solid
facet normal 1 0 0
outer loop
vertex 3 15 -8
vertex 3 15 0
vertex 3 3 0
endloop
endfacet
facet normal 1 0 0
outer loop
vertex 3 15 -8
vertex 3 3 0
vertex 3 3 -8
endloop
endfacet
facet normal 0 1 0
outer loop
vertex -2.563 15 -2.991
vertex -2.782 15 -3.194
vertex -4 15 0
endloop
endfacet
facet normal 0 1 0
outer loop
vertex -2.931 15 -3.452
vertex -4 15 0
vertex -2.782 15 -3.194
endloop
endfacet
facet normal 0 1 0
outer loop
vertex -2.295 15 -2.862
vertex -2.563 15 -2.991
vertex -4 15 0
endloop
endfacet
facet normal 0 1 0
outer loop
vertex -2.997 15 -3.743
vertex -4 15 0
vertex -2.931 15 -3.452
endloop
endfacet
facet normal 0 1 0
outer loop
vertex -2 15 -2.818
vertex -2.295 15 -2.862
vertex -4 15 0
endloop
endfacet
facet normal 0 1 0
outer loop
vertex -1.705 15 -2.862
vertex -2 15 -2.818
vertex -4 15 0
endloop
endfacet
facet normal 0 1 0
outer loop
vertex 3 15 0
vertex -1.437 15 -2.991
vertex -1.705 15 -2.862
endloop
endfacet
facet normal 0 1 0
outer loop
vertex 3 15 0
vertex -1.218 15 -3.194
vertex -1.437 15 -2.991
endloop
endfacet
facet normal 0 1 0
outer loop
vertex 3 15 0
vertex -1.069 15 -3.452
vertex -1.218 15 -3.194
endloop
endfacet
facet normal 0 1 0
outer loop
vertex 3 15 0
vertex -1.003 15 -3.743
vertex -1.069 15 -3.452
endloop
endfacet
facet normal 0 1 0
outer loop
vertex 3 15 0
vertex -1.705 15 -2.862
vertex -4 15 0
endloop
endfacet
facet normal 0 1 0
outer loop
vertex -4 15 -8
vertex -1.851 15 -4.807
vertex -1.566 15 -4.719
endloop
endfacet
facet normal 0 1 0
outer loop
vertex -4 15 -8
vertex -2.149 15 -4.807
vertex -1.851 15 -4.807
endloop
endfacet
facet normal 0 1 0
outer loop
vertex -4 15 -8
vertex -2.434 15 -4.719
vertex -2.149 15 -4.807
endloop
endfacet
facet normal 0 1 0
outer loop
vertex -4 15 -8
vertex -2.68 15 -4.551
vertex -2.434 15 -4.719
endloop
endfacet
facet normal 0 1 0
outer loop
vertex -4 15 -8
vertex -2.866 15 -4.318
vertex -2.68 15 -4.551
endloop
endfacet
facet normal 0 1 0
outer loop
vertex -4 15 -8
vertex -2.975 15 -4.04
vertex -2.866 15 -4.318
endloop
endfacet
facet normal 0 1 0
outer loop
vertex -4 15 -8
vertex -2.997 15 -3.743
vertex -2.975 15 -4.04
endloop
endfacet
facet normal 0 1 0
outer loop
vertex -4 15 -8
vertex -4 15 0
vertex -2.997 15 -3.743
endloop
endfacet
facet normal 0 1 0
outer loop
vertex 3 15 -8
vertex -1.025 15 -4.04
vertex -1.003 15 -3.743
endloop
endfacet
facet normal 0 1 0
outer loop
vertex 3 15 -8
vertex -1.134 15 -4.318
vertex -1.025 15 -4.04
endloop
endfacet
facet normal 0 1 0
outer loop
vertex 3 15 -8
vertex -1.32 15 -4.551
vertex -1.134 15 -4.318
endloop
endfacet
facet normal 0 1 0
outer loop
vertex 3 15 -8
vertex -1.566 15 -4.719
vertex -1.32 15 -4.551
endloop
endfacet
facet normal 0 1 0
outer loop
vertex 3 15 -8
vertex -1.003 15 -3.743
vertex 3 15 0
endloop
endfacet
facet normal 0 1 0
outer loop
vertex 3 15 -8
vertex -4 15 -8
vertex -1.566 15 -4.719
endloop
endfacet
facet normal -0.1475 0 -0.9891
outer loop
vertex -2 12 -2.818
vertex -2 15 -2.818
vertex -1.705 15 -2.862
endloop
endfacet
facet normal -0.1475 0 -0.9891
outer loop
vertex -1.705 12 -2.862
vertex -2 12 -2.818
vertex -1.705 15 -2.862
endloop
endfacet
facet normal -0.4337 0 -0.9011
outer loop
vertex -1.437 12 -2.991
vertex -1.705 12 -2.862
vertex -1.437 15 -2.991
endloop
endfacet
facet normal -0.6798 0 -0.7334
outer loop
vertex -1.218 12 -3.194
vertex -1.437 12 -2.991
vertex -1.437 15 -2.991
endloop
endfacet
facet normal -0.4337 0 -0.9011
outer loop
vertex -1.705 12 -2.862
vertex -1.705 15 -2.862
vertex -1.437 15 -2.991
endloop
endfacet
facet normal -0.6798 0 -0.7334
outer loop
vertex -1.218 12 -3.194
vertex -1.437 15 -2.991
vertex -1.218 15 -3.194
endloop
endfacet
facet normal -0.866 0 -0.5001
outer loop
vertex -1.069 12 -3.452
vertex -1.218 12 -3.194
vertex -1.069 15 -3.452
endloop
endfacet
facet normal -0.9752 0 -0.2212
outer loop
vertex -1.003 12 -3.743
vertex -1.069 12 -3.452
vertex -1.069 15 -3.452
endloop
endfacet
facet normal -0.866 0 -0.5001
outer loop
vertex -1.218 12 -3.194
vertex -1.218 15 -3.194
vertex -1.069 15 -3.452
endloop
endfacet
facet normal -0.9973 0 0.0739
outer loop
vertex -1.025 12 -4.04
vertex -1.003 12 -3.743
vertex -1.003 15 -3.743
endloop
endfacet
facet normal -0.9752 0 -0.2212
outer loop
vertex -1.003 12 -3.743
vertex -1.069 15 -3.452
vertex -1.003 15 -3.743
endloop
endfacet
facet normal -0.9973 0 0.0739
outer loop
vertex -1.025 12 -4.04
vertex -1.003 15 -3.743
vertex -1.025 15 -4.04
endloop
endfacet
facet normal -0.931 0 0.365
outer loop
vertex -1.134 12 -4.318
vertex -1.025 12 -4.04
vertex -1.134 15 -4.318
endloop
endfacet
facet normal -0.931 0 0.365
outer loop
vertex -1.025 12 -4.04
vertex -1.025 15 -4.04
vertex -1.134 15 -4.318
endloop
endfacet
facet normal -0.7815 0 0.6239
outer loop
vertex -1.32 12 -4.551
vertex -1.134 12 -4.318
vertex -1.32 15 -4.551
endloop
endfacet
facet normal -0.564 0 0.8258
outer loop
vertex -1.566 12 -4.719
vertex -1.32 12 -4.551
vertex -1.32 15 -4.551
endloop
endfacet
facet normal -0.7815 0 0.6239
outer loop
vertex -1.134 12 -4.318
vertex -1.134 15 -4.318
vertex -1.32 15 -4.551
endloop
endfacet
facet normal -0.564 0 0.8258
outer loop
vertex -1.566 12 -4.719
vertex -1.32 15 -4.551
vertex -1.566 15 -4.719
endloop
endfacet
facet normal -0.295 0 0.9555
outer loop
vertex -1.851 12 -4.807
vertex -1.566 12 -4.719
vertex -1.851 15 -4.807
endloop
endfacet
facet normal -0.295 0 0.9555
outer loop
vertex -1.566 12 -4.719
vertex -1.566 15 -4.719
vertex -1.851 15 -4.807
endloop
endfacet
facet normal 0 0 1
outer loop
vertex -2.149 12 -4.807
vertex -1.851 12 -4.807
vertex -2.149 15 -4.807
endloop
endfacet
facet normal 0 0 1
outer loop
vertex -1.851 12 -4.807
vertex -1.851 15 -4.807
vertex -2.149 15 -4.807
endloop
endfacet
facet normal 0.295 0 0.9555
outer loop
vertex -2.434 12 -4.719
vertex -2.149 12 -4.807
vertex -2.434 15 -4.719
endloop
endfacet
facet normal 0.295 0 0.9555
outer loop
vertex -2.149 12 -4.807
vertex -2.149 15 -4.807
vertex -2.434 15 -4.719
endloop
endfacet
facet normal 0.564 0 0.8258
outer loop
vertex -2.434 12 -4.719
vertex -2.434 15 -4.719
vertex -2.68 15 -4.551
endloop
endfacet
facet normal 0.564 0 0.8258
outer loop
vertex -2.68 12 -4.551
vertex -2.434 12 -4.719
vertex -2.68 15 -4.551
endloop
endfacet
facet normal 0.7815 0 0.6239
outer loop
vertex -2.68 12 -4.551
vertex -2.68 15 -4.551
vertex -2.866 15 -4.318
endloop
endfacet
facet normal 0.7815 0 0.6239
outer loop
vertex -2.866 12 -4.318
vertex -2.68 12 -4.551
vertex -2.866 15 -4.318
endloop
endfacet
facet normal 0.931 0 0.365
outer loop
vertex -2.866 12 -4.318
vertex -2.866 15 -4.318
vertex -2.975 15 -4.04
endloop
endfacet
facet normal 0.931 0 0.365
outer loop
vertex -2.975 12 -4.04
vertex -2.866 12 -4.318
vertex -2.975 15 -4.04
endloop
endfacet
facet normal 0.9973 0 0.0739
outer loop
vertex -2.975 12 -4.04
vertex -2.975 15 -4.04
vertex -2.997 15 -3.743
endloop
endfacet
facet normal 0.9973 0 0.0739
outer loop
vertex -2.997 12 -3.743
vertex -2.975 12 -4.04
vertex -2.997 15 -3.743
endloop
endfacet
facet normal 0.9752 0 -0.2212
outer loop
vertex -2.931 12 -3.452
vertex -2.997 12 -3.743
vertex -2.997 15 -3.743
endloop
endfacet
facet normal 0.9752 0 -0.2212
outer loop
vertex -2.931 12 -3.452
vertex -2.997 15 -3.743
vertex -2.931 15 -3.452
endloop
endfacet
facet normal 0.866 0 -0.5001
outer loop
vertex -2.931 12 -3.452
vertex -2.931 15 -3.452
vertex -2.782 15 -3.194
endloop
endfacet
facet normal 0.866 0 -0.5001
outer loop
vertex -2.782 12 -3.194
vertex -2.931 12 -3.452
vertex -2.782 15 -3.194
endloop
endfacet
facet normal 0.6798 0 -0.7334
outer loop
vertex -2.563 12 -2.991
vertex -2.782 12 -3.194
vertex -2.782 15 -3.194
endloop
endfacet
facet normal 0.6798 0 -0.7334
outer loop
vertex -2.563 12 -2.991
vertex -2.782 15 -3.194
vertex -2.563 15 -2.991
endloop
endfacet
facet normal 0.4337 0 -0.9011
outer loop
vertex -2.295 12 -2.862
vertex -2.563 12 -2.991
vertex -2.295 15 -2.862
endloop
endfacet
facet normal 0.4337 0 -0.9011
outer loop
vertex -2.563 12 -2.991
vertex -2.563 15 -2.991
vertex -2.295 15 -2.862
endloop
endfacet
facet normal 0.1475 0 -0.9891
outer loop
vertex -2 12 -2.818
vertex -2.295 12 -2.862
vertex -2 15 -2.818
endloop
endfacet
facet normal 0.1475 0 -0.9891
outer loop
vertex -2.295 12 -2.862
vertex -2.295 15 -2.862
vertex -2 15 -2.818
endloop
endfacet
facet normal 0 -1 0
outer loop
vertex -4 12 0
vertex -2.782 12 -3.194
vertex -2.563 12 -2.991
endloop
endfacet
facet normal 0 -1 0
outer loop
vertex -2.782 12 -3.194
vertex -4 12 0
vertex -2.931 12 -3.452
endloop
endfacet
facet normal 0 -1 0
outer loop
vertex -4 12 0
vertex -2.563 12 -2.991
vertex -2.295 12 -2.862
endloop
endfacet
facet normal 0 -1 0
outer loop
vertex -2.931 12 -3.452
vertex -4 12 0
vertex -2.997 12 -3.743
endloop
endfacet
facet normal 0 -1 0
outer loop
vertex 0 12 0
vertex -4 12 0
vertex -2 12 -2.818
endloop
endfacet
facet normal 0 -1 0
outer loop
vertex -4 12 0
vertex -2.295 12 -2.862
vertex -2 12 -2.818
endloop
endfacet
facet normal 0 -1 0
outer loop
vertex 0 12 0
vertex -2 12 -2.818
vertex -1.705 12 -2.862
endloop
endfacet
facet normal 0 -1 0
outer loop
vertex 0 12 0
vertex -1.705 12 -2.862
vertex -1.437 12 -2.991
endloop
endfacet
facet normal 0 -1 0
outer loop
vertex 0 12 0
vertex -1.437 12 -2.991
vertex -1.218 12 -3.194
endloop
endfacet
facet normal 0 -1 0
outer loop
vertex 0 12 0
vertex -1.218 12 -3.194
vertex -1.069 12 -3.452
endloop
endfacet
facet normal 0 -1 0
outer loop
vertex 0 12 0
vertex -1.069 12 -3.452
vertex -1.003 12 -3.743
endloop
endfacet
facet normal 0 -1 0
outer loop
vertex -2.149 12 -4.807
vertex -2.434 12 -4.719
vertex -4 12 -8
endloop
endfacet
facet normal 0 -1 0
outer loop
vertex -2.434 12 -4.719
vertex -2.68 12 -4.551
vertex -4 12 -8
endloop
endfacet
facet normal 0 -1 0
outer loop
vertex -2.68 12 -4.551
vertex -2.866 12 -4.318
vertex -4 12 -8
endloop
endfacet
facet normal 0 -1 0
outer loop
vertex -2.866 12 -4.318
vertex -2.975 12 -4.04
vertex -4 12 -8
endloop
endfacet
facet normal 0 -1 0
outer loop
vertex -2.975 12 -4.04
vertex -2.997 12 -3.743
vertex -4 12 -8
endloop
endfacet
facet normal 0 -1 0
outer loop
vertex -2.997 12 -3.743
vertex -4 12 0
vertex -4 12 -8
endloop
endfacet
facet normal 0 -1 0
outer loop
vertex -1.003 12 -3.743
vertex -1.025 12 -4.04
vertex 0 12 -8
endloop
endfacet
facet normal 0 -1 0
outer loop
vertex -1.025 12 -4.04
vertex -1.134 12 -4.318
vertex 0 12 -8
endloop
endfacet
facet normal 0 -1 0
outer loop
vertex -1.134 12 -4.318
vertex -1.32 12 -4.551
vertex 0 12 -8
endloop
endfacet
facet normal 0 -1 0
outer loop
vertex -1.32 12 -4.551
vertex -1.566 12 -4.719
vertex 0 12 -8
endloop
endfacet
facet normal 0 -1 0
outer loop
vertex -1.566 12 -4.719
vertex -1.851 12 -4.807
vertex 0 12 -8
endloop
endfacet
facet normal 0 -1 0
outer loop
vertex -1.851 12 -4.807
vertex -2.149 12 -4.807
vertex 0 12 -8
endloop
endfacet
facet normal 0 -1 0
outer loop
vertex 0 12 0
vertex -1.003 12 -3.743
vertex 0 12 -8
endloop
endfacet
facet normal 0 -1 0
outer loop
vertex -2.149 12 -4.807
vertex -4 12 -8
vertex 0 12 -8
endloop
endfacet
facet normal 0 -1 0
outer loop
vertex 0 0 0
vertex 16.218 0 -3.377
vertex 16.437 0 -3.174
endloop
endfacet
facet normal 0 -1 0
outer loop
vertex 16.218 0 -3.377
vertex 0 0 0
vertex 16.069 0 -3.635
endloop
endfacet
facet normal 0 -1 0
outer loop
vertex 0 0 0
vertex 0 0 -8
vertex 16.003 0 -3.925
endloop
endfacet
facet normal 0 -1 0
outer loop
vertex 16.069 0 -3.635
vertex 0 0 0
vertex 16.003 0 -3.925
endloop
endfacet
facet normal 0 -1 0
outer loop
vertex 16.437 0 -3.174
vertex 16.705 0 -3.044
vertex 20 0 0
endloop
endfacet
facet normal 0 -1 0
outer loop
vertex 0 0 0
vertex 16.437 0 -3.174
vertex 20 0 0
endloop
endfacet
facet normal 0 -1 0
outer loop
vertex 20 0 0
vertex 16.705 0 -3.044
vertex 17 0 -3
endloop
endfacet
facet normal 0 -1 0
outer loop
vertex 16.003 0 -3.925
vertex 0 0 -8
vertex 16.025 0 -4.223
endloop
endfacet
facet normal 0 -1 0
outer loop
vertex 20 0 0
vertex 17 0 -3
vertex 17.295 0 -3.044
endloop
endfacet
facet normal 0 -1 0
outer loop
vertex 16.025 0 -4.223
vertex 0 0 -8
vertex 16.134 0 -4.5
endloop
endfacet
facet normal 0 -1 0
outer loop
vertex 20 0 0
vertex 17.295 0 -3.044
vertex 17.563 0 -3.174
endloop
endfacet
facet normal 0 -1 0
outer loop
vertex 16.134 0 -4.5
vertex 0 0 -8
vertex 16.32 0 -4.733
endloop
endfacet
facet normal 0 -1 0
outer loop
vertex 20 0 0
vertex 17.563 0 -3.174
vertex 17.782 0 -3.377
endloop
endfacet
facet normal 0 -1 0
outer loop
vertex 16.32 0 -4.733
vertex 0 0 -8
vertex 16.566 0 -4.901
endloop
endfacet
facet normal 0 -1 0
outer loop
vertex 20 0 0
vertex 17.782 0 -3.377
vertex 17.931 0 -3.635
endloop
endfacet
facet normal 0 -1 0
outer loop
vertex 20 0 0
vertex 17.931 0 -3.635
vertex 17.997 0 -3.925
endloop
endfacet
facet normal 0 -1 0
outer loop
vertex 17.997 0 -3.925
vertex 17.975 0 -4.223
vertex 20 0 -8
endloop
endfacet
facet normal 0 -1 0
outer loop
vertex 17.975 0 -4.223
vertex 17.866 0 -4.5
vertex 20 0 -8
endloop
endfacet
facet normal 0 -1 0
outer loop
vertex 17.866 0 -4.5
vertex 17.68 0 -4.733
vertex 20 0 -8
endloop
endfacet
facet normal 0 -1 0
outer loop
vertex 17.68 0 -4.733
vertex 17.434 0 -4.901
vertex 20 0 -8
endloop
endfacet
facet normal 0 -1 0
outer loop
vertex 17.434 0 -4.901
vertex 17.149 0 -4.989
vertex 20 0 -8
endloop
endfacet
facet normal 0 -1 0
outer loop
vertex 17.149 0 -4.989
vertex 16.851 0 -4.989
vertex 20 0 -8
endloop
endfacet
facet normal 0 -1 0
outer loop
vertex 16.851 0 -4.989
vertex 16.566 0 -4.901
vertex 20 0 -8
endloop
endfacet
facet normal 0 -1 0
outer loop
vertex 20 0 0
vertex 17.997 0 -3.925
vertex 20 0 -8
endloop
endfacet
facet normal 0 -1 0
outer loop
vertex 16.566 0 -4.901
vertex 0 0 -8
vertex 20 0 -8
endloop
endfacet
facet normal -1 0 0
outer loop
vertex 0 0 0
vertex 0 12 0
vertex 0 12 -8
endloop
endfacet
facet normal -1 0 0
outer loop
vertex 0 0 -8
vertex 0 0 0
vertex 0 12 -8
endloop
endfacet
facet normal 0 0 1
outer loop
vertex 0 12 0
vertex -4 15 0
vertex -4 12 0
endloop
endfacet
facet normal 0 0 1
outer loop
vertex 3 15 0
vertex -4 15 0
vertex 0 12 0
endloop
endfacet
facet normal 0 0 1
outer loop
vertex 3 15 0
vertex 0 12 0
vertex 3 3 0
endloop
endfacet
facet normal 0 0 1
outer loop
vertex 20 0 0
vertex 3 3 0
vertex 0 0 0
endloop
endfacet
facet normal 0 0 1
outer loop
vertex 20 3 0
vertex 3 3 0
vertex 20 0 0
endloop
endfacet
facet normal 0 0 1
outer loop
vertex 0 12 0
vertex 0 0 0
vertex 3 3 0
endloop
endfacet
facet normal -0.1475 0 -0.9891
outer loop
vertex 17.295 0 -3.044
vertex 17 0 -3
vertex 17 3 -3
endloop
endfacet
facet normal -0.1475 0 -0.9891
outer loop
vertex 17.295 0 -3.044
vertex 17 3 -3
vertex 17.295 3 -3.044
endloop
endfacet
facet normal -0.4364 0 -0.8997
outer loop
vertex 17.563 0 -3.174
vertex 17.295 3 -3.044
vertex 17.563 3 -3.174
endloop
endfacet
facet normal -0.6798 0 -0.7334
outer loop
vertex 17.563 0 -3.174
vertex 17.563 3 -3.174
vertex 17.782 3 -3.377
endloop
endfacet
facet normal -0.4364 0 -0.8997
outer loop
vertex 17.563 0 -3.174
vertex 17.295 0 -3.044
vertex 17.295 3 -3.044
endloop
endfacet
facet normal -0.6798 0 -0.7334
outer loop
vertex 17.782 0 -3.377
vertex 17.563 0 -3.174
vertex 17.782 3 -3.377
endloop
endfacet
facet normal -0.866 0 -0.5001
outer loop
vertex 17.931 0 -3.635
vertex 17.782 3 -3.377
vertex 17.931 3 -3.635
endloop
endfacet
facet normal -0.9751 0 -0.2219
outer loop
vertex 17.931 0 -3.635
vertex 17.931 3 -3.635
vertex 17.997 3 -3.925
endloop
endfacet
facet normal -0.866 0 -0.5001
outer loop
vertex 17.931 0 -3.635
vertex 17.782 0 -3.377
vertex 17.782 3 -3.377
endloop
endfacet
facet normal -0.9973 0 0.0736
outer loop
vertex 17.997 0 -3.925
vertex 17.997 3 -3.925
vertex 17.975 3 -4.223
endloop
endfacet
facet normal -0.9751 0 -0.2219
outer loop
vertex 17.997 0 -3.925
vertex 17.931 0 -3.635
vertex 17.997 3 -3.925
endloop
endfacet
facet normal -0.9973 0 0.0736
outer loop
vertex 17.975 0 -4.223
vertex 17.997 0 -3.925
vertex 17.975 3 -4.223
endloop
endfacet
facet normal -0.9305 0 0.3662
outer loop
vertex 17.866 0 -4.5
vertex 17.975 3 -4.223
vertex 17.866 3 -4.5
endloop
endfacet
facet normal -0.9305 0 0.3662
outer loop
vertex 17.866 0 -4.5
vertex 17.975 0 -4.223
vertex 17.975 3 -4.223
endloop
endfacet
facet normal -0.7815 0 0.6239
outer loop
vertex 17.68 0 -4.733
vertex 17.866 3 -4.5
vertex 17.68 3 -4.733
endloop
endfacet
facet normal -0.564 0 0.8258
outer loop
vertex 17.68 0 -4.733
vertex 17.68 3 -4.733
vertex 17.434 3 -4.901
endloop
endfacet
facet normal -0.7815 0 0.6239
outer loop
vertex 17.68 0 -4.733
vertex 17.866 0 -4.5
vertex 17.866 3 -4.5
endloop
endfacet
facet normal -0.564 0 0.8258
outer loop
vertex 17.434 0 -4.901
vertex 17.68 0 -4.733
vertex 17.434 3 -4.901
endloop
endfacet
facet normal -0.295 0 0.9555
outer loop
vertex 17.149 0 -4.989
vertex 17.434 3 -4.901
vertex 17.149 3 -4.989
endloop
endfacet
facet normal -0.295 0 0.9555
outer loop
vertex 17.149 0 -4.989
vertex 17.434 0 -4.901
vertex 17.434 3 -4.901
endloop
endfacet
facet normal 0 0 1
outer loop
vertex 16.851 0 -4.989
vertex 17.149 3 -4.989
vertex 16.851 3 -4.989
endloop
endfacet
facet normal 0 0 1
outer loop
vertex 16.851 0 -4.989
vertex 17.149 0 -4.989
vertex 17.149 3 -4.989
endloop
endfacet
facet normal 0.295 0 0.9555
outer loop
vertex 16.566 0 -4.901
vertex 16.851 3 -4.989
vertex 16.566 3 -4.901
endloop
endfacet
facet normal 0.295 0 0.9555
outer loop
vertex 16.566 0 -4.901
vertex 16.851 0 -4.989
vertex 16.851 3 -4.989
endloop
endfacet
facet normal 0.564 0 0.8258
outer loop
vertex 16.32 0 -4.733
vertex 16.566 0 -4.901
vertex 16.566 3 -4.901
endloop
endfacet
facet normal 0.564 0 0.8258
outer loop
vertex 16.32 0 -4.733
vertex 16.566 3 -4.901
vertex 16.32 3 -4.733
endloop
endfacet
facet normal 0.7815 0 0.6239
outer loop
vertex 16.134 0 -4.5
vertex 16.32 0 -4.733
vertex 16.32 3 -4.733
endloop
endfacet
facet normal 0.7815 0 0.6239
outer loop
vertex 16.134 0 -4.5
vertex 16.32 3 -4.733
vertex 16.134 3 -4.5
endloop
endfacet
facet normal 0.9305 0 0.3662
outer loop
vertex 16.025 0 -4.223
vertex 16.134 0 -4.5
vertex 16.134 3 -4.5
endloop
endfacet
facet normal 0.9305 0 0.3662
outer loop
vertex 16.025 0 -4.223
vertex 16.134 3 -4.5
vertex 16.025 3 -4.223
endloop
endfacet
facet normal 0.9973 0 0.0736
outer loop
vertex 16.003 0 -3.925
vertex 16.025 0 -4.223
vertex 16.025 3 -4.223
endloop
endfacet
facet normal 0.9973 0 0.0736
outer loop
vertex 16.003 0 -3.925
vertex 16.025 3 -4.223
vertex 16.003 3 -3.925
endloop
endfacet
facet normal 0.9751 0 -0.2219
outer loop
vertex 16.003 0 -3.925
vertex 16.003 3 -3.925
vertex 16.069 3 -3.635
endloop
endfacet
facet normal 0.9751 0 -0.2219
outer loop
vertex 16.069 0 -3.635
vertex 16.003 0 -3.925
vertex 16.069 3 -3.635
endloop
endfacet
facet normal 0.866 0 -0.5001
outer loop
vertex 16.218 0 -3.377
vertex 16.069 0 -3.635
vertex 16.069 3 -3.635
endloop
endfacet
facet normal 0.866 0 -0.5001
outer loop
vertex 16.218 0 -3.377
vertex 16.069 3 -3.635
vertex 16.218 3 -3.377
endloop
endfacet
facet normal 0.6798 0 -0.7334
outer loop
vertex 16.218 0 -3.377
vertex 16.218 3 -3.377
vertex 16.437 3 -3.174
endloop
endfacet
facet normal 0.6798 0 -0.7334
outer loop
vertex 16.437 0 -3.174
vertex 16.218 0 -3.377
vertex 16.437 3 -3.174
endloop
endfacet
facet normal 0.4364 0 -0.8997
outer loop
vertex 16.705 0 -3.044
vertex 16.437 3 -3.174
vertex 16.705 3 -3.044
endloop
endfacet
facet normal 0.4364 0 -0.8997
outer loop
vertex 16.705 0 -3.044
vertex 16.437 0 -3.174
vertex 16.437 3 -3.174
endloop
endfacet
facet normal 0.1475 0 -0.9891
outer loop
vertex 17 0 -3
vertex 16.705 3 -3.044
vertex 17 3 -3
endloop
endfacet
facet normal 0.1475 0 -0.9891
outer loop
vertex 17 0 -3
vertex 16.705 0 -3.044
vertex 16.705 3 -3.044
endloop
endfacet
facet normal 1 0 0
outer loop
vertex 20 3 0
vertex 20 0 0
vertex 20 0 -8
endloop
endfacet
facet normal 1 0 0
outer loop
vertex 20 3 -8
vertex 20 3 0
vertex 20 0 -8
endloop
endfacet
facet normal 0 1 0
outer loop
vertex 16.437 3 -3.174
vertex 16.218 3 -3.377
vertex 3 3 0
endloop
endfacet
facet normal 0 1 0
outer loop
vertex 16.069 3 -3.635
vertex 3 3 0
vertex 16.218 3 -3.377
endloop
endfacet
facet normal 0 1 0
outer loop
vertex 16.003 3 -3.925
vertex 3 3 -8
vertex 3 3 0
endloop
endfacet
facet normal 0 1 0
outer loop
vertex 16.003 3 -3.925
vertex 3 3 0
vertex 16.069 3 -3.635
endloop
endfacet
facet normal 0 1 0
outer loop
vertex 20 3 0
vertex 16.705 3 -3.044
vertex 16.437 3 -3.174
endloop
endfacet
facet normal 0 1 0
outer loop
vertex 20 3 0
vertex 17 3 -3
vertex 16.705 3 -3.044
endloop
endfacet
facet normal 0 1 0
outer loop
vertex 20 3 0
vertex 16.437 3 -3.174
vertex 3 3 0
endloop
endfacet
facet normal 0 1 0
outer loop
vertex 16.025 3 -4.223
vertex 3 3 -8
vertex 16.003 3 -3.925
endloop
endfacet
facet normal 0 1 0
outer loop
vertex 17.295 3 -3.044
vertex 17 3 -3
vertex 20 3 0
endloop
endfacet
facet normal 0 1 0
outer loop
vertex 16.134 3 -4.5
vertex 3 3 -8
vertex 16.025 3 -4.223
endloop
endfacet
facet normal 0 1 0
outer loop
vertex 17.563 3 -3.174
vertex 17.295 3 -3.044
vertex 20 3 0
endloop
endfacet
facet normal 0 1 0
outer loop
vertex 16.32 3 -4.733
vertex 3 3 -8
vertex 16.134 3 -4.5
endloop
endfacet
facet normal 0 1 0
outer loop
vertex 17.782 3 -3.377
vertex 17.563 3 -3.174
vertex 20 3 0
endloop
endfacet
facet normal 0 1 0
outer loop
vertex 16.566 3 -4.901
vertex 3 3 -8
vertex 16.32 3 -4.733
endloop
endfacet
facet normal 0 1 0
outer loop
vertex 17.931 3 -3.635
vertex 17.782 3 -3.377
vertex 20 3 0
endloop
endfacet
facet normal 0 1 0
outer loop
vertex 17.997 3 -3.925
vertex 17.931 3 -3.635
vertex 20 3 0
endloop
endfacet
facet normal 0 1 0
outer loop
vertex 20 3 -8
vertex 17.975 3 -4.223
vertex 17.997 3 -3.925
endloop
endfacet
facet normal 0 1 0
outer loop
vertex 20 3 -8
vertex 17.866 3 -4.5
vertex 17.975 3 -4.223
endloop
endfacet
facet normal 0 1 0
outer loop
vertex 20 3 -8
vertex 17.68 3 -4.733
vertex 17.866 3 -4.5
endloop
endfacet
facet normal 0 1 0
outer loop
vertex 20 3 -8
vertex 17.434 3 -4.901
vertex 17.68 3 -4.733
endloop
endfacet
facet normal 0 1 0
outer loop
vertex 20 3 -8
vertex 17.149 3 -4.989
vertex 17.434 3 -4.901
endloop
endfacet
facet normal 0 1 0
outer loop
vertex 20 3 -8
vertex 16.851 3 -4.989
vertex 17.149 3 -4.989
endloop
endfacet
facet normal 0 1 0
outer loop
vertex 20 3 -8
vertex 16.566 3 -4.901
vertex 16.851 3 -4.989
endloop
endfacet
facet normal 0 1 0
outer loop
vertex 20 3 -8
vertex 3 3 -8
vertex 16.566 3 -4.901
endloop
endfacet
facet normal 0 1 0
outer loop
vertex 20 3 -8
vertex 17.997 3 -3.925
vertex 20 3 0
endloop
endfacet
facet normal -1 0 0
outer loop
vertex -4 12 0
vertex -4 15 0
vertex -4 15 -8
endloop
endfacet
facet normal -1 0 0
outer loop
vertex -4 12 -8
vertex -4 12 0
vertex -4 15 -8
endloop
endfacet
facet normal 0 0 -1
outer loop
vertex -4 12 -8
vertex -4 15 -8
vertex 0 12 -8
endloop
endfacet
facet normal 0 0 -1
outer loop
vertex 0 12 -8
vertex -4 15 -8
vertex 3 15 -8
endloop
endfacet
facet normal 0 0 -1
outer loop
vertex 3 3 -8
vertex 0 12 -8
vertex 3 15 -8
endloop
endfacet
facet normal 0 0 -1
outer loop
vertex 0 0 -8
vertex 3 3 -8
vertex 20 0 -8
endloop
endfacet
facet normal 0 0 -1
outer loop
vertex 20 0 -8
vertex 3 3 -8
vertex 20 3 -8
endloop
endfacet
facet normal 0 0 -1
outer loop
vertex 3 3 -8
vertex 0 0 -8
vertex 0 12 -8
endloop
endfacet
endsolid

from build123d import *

# Parameters (mm, degrees)
SKETCH1_W           = 8
SKETCH1_H           = 15
BOSS_EXTRUDE1_DEPTH = 3
SKETCH2_W           = 17
SKETCH2_H           = 8
SKETCH2_R           = 1
BOSS_EXTRUDE2_DEPTH = 3
SKETCH3_W           = 4
SKETCH3_H           = 8
SKETCH3_R           = 1
BOSS_EXTRUDE3_DEPTH = 3


with BuildPart() as part:
    # Sketch1 → Boss-Extrude1 (new body)
    with BuildSketch(Plane(origin=(0, 0, 0), x_dir=(0, 0, -1), z_dir=(1, 0, 0))):
        with Locations((4, 7.5)):
            Rectangle(SKETCH1_W, SKETCH1_H)
    extrude(amount=BOSS_EXTRUDE1_DEPTH)

    # Sketch2 → Boss-Extrude2 (add)
    with BuildSketch(Plane(origin=(0, 0, 0), x_dir=(1, 0, 0), z_dir=(0, 1, 0))):
        with Locations((11.5, 4)):
            Rectangle(SKETCH2_W, SKETCH2_H)
        with Locations(Location((17, 4, 0), (0, 0, 270))):
            Circle(SKETCH2_R, mode=Mode.SUBTRACT)
    extrude(amount=BOSS_EXTRUDE2_DEPTH)

    # Sketch3 → Boss-Extrude3 (add)
    with BuildSketch(Plane(origin=(0, 15, 0), x_dir=(1, 0, 0), z_dir=(0, 1, 0))):
        with Locations((-2, 4)):
            Rectangle(SKETCH3_W, SKETCH3_H)
        with Locations(Location((-2, 3.81772143, 0), (0, 0, 270))):
            Circle(SKETCH3_R, mode=Mode.SUBTRACT)
    extrude(amount=-BOSS_EXTRUDE3_DEPTH)


solid = part.part
